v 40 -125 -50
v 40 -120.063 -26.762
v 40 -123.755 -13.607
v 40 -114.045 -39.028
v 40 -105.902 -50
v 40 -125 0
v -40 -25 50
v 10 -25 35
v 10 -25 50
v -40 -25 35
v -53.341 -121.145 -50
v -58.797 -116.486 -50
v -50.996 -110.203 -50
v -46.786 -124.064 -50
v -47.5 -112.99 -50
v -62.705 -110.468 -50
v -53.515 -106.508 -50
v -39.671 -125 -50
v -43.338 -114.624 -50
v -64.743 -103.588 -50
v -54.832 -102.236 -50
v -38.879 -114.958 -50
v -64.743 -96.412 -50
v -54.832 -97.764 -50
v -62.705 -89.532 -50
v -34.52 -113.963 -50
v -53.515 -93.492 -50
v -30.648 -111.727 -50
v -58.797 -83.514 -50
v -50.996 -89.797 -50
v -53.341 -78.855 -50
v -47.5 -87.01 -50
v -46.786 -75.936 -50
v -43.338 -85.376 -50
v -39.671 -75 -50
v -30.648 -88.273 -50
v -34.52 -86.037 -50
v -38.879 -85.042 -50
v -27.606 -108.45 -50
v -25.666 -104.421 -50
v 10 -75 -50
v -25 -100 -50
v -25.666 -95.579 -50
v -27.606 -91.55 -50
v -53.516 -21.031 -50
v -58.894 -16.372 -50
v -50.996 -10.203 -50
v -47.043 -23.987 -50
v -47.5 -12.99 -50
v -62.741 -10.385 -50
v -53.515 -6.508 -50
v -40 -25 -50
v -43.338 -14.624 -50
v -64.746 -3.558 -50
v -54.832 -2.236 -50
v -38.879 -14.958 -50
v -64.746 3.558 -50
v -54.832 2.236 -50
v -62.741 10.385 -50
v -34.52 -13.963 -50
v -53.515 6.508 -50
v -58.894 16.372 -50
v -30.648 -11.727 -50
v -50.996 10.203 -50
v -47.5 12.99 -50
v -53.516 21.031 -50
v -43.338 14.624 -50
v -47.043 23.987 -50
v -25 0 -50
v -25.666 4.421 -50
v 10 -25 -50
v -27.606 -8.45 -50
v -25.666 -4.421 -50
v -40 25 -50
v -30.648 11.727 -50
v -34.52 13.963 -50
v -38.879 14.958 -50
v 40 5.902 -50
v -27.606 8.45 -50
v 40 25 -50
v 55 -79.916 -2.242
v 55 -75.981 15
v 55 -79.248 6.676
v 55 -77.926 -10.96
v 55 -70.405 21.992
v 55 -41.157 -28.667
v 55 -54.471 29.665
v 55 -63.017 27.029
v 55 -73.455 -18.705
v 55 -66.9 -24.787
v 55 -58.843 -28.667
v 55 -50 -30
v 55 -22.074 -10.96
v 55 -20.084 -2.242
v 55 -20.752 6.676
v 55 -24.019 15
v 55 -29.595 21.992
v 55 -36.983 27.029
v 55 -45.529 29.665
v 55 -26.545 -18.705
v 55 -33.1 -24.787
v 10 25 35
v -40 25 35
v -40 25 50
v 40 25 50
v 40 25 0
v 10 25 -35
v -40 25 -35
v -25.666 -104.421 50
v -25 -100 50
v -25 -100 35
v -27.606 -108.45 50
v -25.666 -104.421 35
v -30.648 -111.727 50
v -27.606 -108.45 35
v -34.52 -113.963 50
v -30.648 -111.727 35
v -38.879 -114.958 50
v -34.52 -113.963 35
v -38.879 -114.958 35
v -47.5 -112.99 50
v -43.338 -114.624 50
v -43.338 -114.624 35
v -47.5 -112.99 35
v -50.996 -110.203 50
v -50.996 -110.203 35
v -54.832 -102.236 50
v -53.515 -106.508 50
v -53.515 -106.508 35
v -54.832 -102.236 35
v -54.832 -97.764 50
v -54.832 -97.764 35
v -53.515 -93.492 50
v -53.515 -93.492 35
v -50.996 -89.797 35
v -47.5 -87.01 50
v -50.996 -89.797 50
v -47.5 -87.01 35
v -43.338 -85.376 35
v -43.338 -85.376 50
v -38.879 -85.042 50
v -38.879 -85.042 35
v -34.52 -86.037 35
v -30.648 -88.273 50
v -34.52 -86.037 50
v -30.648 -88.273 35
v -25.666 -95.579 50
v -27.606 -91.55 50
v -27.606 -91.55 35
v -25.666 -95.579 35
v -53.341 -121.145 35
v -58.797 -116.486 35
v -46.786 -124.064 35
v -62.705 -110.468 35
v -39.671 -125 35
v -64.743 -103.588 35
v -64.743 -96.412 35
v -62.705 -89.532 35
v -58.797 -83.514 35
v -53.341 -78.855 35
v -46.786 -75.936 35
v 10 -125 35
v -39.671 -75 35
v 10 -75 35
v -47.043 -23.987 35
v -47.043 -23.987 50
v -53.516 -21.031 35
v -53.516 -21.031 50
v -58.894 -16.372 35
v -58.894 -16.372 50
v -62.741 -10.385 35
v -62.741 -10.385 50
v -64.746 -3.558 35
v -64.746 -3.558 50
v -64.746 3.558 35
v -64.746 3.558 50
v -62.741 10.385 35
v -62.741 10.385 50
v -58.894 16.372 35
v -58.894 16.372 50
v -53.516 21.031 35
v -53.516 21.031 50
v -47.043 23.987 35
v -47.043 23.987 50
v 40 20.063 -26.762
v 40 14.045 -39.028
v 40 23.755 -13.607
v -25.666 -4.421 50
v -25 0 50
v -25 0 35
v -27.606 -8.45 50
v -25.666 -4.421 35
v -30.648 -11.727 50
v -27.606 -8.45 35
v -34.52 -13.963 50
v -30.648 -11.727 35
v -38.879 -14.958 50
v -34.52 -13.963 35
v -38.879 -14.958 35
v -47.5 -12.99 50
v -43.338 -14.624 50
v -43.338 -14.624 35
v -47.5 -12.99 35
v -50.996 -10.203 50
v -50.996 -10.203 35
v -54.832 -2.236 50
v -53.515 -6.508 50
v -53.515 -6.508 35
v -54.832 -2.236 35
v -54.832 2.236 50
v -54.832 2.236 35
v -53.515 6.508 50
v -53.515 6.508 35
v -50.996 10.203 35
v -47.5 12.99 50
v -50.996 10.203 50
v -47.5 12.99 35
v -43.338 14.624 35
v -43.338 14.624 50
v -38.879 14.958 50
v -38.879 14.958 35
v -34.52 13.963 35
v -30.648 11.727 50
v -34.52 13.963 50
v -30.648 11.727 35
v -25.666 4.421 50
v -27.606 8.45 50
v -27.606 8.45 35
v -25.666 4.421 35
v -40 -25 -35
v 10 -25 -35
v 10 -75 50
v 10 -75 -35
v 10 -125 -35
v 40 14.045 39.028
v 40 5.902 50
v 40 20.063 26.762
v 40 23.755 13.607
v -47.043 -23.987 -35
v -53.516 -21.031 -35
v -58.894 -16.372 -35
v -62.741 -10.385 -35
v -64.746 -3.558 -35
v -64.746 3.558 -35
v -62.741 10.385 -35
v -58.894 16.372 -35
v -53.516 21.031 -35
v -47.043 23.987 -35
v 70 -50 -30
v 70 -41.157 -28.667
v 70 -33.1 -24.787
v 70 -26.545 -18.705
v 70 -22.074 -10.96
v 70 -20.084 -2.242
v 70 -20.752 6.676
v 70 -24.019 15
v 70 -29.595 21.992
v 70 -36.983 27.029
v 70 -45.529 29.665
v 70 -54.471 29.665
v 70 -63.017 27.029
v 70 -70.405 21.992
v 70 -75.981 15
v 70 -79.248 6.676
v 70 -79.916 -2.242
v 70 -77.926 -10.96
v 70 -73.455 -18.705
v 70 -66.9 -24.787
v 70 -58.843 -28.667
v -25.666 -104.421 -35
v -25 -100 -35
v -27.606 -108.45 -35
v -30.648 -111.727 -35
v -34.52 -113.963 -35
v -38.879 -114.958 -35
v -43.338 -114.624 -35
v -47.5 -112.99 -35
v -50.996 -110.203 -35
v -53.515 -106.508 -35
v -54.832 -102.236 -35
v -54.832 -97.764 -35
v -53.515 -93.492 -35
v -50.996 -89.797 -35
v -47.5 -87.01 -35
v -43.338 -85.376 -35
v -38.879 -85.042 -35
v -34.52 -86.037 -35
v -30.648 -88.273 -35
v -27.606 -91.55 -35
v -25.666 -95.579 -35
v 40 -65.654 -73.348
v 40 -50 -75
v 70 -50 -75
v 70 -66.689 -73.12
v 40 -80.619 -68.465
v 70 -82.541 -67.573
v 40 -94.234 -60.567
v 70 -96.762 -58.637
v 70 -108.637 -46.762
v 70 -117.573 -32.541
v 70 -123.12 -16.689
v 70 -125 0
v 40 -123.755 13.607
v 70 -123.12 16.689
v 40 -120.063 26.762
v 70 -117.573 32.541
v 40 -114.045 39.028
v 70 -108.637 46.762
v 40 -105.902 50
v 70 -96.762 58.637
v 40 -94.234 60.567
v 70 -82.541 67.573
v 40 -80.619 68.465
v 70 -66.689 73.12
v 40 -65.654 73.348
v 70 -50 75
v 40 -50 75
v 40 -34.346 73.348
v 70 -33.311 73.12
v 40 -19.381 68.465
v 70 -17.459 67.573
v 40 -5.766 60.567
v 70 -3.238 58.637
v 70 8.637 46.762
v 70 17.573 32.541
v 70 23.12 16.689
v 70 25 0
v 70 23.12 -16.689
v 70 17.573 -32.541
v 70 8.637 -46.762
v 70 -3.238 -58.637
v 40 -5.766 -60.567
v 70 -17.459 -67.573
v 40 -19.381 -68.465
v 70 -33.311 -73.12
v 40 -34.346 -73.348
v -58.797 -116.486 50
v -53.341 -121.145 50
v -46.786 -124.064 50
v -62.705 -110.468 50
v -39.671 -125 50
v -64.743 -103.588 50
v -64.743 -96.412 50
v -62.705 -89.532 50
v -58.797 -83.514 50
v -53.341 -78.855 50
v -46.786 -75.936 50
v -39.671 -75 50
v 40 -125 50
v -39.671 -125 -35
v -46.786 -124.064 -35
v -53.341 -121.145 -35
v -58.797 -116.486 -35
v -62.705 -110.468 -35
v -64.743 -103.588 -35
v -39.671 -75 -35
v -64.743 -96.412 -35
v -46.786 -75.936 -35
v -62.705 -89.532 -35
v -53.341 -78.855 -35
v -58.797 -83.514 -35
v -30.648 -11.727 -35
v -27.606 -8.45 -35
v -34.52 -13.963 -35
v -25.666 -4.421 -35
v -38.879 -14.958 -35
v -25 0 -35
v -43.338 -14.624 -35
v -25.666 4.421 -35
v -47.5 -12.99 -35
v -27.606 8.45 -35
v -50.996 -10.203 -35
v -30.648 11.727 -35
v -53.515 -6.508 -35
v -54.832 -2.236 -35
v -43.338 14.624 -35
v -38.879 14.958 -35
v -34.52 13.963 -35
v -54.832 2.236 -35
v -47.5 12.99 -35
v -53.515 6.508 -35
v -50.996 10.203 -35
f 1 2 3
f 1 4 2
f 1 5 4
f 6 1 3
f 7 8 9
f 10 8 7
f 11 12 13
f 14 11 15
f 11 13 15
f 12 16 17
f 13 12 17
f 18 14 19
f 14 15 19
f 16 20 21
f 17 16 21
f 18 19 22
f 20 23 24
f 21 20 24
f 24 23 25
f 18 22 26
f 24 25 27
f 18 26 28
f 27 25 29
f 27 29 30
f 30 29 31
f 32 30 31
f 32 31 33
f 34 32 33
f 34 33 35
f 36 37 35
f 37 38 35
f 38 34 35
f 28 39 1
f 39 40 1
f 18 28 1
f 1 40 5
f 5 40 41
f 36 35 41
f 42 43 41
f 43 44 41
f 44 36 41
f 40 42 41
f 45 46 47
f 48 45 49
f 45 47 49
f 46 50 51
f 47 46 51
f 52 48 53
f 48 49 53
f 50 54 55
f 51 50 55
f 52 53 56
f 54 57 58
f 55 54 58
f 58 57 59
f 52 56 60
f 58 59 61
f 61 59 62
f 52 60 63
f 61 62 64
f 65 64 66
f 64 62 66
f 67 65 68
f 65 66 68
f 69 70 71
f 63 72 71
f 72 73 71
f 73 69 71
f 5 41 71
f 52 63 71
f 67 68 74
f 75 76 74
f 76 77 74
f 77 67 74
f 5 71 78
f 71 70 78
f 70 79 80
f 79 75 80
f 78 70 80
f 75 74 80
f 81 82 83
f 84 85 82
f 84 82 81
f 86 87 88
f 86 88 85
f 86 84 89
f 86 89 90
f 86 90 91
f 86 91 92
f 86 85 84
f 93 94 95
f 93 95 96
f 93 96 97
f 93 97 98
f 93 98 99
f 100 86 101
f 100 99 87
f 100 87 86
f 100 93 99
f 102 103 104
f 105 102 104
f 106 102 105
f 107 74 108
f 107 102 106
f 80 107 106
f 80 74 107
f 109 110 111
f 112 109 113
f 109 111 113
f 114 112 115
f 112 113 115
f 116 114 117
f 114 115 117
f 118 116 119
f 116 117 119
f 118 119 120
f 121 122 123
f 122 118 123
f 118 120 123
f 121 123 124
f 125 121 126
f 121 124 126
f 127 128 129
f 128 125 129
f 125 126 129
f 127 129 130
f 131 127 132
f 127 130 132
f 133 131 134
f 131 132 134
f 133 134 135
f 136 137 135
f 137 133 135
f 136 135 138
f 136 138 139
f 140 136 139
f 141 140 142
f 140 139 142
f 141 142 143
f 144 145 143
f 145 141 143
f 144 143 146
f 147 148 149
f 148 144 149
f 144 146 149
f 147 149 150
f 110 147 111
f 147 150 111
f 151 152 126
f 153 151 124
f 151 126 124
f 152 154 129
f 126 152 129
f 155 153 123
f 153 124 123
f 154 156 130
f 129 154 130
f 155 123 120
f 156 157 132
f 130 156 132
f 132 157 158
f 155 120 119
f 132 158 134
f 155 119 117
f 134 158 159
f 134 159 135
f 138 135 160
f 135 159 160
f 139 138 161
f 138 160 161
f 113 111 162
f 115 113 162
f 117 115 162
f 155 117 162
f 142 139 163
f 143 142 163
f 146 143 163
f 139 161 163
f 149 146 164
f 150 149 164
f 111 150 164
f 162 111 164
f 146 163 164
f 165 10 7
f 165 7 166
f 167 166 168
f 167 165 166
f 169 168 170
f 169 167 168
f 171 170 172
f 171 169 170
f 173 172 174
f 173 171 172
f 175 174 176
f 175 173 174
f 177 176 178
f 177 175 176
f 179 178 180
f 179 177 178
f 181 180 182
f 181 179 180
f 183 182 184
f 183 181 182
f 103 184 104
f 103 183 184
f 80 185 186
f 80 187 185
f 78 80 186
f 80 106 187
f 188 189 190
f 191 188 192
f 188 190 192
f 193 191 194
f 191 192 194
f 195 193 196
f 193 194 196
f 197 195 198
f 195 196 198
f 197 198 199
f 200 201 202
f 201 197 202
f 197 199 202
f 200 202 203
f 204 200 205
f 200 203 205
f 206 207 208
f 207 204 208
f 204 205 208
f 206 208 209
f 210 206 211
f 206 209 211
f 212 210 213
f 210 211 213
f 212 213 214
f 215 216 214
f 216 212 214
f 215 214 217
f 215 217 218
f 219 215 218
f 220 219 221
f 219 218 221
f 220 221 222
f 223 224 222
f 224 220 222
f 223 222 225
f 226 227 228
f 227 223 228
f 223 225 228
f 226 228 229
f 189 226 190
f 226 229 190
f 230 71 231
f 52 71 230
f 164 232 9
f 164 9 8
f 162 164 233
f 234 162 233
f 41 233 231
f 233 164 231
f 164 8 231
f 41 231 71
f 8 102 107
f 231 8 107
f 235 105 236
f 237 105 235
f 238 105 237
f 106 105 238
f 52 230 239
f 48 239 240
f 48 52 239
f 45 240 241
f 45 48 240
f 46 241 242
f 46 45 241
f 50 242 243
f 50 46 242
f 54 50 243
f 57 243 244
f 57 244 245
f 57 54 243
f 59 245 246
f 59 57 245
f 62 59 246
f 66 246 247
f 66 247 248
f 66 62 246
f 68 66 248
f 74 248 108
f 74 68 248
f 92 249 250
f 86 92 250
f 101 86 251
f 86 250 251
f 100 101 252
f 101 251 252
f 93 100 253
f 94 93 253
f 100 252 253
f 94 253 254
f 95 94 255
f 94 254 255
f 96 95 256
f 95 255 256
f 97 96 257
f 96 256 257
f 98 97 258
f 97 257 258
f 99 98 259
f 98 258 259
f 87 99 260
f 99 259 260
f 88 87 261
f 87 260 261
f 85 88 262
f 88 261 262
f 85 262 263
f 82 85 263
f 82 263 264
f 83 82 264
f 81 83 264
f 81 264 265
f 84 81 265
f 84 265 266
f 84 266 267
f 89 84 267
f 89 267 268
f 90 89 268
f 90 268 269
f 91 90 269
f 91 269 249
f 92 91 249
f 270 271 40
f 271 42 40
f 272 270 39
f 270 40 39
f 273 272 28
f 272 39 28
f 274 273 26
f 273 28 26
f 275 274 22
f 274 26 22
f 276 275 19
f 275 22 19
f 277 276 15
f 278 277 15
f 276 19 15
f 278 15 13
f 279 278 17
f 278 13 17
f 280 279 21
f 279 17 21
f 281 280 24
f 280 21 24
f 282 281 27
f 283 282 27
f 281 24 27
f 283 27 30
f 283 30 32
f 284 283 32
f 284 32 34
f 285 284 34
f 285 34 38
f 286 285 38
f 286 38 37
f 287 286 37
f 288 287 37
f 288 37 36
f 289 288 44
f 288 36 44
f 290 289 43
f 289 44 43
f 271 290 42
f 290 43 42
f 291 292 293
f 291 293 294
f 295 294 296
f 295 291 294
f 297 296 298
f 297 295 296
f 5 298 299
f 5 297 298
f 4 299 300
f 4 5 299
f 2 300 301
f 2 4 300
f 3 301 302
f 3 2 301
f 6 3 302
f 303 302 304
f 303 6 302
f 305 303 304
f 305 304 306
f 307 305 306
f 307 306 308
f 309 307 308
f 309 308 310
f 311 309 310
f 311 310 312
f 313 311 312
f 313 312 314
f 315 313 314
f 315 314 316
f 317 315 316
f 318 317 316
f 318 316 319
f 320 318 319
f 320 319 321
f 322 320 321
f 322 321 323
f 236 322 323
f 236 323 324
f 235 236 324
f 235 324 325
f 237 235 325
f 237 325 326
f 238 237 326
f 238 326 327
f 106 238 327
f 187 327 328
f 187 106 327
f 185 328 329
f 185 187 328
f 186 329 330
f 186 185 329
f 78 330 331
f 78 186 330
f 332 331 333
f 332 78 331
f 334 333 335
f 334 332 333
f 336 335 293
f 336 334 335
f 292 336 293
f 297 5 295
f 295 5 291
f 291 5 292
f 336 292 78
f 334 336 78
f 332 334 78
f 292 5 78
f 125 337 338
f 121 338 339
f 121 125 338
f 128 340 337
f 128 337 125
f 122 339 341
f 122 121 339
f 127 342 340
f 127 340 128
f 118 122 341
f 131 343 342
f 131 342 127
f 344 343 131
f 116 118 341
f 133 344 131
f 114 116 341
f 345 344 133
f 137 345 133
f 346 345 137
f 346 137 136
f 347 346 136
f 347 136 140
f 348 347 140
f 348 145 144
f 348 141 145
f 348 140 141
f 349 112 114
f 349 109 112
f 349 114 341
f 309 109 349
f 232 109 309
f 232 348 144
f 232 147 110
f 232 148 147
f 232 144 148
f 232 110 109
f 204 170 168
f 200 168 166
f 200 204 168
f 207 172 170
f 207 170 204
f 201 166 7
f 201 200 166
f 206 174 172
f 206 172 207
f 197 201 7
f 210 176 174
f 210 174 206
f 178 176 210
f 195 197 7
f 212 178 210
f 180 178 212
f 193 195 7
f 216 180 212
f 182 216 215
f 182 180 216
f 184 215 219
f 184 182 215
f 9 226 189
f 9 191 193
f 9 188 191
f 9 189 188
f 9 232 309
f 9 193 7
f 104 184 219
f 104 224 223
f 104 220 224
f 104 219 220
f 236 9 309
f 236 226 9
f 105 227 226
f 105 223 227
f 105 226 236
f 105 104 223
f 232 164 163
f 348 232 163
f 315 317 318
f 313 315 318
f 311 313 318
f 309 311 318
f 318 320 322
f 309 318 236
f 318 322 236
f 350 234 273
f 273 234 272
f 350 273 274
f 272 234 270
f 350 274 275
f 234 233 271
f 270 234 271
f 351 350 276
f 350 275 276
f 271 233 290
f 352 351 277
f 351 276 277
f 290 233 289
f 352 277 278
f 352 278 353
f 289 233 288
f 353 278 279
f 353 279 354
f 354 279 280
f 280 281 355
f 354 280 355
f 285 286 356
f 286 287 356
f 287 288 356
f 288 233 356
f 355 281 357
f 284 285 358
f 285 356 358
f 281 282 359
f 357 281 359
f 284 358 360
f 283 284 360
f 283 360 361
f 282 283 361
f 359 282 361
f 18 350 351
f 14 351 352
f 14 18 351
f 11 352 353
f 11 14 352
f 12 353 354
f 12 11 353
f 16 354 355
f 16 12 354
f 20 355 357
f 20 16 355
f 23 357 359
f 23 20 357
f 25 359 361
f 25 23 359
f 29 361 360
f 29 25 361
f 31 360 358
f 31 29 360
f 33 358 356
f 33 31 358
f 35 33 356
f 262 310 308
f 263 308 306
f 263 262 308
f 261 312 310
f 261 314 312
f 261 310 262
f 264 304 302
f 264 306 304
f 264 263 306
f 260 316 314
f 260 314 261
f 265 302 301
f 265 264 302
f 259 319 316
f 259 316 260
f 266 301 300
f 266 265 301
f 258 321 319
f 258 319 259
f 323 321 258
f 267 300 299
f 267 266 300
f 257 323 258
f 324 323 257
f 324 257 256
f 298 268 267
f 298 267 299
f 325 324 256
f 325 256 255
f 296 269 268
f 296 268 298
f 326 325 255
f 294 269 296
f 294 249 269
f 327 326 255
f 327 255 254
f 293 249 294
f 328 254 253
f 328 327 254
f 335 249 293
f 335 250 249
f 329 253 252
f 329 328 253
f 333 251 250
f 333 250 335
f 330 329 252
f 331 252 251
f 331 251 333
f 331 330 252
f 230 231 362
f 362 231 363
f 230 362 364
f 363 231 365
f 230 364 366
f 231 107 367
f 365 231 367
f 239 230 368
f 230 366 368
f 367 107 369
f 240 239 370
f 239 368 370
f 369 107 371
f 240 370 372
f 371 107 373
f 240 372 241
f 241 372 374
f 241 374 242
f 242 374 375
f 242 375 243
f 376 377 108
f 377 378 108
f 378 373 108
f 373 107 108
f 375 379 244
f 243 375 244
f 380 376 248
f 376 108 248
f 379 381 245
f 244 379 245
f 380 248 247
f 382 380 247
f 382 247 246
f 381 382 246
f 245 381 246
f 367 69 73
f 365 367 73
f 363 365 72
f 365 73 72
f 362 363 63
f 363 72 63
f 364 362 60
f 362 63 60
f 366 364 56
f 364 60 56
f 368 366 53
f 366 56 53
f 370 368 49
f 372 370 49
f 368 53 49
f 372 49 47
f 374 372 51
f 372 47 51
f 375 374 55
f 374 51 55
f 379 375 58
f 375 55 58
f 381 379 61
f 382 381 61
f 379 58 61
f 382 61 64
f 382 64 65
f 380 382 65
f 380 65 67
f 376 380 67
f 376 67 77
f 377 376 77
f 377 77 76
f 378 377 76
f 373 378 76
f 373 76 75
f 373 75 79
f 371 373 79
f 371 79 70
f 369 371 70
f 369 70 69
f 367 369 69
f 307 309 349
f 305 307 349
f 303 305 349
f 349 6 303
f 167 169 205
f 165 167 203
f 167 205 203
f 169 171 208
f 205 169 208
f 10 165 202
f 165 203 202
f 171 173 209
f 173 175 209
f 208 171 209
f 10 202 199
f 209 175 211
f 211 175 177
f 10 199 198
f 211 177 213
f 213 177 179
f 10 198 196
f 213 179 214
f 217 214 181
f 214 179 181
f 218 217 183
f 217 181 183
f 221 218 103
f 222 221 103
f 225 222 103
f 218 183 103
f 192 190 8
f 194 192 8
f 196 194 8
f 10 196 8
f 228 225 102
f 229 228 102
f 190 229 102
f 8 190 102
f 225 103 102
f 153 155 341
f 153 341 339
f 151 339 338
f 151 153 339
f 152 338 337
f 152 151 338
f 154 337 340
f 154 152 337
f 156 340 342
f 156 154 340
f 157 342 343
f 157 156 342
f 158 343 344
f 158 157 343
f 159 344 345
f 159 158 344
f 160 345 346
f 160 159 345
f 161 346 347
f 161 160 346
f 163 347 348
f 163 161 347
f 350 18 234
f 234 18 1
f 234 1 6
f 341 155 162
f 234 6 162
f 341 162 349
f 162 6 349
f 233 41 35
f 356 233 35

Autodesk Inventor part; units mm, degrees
ref_plane "YZ Plane" through (0, 0, 0) normal (1, 0, 0) x (0, 1, 0)
ref_plane "XZ Plane" through (0, 0, 0) normal (0, 1, 0) x (-1, 0, 0)
ref_plane "XY Plane" through (0, 0, 0) normal (0, 0, 1) x (1, 0, 0)
sketch "草图1" plane through (0, 0, 0) normal (0, 0, 1) x (1, 0, 0)
  line L0 (-40, 25) -> (40, 25)
  line L1 (40, 25) -> (40, -25)
  line L2 (40, -25) -> (-40, -25)
  line L3 (-40, 25) -> (40, -25) construction
  line L4 (40, 25) -> (-40, -25) construction
  arc A0 (-40, 25) -> (-40, -25) centre (-40, 0) ccw
  circle A1 centre (-40, 0) radius 15
  line L5 (-39.6714, -125) -> (39.6714, -125)
  line L6 (39.6714, -125) -> (39.6714, -75)
  line L7 (39.6714, -75) -> (-39.6714, -75)
  line L8 (-39.6714, -125) -> (39.6714, -75) construction
  line L9 (39.6714, -125) -> (-39.6714, -75) construction
  arc A2 (-39.6714, -75) -> (-39.6714, -125) centre (-40, -100) ccw
  circle A3 centre (-40, -100) radius 15
  point P0 (0, 0)
  point P1 (0, -100)
  dimension "d0" = 50
  dimension "d3" = 30
  dimension "d11" = 50
  dimension "d12" = 30
  dimension "d13" = 100
  dimension "d14" = 0
  dimension "d15" = 25
  dimension "d16" = 80
extrude "拉伸1" add sketch "草图1" along normal mid plane 100
sketch "草图2" plane through (-40, 25, 50) normal (0, 1, 0) x (1, 0, 0)
  line L0 (40, 50) -> (0, 50)
  line L1 (0, 100) -> (0, 0) projected
  line L2 (50, 85) -> (-98.1355, 85)
  line L3 (-98.1355, 85) -> (-98.1355, 15)
  line L4 (-98.1355, 15) -> (50, 15)
  line L5 (50, 15) -> (50, 85)
  line L6 (50, 85) -> (-98.1355, 15) construction
  line L7 (-98.1355, 85) -> (50, 15) construction
  line L8 (80, 0) -> (80, 100) projected
  point P0 (-24.0677, 50)
  dimension "d4" = 30
  dimension "d5" = 70
extrude "拉伸2" cut sketch "草图2" against normal through all
sketch "草图3" plane through (40, -25, 50) normal (1, 0, 0) x (0, 0, -1)
  line L0 (100, 50) -> (0, 50) projected
  line L1 (0, 50) -> (100, 50)
  line L2 (100, 50) -> (100, -100)
  line L3 (100, -100) -> (0, -100)
  line L4 (0, -100) -> (0, 50)
  point P0 (50, 25)
  point P1 (15, 50)
  dimension "d8" = 150
extrude "拉伸3" add sketch "草图3" against normal blind 30
sketch "草图4" plane through (40, -125, 50) normal (1, 0, 0) x (0, 0, -1)
  line L0 (100, 100) -> (100, 50) projected
  line L1 (100, 75) -> (0, 75)
  line L2 (0, 0) -> (0, 150) projected
  line L3 (15, 0) -> (85, 0) projected
  line L4 (50, 0) -> (50, 150)
  line L5 (0, 150) -> (100, 150) projected
  circle A0 centre (50, 75) radius 75
  point P0 (50, 125)
extrude "拉伸4" add sketch "草图4" along normal blind 30 contours L4 A0 L2 L1 | L4 A0 | L1 L2 A0 L4 | L2 A0
sketch "草图5" plane through (70, -50, 0) normal (1, 0, 0) x (0, 0, -1)
  circle A0 centre (0, 0) radius 30
  point P0 (0, 50)
  dimension "d19" = 60
extrude "拉伸5" cut sketch "草图5" against normal blind 15
properties part number "Wrist" material "钢，高强度，低合金"
